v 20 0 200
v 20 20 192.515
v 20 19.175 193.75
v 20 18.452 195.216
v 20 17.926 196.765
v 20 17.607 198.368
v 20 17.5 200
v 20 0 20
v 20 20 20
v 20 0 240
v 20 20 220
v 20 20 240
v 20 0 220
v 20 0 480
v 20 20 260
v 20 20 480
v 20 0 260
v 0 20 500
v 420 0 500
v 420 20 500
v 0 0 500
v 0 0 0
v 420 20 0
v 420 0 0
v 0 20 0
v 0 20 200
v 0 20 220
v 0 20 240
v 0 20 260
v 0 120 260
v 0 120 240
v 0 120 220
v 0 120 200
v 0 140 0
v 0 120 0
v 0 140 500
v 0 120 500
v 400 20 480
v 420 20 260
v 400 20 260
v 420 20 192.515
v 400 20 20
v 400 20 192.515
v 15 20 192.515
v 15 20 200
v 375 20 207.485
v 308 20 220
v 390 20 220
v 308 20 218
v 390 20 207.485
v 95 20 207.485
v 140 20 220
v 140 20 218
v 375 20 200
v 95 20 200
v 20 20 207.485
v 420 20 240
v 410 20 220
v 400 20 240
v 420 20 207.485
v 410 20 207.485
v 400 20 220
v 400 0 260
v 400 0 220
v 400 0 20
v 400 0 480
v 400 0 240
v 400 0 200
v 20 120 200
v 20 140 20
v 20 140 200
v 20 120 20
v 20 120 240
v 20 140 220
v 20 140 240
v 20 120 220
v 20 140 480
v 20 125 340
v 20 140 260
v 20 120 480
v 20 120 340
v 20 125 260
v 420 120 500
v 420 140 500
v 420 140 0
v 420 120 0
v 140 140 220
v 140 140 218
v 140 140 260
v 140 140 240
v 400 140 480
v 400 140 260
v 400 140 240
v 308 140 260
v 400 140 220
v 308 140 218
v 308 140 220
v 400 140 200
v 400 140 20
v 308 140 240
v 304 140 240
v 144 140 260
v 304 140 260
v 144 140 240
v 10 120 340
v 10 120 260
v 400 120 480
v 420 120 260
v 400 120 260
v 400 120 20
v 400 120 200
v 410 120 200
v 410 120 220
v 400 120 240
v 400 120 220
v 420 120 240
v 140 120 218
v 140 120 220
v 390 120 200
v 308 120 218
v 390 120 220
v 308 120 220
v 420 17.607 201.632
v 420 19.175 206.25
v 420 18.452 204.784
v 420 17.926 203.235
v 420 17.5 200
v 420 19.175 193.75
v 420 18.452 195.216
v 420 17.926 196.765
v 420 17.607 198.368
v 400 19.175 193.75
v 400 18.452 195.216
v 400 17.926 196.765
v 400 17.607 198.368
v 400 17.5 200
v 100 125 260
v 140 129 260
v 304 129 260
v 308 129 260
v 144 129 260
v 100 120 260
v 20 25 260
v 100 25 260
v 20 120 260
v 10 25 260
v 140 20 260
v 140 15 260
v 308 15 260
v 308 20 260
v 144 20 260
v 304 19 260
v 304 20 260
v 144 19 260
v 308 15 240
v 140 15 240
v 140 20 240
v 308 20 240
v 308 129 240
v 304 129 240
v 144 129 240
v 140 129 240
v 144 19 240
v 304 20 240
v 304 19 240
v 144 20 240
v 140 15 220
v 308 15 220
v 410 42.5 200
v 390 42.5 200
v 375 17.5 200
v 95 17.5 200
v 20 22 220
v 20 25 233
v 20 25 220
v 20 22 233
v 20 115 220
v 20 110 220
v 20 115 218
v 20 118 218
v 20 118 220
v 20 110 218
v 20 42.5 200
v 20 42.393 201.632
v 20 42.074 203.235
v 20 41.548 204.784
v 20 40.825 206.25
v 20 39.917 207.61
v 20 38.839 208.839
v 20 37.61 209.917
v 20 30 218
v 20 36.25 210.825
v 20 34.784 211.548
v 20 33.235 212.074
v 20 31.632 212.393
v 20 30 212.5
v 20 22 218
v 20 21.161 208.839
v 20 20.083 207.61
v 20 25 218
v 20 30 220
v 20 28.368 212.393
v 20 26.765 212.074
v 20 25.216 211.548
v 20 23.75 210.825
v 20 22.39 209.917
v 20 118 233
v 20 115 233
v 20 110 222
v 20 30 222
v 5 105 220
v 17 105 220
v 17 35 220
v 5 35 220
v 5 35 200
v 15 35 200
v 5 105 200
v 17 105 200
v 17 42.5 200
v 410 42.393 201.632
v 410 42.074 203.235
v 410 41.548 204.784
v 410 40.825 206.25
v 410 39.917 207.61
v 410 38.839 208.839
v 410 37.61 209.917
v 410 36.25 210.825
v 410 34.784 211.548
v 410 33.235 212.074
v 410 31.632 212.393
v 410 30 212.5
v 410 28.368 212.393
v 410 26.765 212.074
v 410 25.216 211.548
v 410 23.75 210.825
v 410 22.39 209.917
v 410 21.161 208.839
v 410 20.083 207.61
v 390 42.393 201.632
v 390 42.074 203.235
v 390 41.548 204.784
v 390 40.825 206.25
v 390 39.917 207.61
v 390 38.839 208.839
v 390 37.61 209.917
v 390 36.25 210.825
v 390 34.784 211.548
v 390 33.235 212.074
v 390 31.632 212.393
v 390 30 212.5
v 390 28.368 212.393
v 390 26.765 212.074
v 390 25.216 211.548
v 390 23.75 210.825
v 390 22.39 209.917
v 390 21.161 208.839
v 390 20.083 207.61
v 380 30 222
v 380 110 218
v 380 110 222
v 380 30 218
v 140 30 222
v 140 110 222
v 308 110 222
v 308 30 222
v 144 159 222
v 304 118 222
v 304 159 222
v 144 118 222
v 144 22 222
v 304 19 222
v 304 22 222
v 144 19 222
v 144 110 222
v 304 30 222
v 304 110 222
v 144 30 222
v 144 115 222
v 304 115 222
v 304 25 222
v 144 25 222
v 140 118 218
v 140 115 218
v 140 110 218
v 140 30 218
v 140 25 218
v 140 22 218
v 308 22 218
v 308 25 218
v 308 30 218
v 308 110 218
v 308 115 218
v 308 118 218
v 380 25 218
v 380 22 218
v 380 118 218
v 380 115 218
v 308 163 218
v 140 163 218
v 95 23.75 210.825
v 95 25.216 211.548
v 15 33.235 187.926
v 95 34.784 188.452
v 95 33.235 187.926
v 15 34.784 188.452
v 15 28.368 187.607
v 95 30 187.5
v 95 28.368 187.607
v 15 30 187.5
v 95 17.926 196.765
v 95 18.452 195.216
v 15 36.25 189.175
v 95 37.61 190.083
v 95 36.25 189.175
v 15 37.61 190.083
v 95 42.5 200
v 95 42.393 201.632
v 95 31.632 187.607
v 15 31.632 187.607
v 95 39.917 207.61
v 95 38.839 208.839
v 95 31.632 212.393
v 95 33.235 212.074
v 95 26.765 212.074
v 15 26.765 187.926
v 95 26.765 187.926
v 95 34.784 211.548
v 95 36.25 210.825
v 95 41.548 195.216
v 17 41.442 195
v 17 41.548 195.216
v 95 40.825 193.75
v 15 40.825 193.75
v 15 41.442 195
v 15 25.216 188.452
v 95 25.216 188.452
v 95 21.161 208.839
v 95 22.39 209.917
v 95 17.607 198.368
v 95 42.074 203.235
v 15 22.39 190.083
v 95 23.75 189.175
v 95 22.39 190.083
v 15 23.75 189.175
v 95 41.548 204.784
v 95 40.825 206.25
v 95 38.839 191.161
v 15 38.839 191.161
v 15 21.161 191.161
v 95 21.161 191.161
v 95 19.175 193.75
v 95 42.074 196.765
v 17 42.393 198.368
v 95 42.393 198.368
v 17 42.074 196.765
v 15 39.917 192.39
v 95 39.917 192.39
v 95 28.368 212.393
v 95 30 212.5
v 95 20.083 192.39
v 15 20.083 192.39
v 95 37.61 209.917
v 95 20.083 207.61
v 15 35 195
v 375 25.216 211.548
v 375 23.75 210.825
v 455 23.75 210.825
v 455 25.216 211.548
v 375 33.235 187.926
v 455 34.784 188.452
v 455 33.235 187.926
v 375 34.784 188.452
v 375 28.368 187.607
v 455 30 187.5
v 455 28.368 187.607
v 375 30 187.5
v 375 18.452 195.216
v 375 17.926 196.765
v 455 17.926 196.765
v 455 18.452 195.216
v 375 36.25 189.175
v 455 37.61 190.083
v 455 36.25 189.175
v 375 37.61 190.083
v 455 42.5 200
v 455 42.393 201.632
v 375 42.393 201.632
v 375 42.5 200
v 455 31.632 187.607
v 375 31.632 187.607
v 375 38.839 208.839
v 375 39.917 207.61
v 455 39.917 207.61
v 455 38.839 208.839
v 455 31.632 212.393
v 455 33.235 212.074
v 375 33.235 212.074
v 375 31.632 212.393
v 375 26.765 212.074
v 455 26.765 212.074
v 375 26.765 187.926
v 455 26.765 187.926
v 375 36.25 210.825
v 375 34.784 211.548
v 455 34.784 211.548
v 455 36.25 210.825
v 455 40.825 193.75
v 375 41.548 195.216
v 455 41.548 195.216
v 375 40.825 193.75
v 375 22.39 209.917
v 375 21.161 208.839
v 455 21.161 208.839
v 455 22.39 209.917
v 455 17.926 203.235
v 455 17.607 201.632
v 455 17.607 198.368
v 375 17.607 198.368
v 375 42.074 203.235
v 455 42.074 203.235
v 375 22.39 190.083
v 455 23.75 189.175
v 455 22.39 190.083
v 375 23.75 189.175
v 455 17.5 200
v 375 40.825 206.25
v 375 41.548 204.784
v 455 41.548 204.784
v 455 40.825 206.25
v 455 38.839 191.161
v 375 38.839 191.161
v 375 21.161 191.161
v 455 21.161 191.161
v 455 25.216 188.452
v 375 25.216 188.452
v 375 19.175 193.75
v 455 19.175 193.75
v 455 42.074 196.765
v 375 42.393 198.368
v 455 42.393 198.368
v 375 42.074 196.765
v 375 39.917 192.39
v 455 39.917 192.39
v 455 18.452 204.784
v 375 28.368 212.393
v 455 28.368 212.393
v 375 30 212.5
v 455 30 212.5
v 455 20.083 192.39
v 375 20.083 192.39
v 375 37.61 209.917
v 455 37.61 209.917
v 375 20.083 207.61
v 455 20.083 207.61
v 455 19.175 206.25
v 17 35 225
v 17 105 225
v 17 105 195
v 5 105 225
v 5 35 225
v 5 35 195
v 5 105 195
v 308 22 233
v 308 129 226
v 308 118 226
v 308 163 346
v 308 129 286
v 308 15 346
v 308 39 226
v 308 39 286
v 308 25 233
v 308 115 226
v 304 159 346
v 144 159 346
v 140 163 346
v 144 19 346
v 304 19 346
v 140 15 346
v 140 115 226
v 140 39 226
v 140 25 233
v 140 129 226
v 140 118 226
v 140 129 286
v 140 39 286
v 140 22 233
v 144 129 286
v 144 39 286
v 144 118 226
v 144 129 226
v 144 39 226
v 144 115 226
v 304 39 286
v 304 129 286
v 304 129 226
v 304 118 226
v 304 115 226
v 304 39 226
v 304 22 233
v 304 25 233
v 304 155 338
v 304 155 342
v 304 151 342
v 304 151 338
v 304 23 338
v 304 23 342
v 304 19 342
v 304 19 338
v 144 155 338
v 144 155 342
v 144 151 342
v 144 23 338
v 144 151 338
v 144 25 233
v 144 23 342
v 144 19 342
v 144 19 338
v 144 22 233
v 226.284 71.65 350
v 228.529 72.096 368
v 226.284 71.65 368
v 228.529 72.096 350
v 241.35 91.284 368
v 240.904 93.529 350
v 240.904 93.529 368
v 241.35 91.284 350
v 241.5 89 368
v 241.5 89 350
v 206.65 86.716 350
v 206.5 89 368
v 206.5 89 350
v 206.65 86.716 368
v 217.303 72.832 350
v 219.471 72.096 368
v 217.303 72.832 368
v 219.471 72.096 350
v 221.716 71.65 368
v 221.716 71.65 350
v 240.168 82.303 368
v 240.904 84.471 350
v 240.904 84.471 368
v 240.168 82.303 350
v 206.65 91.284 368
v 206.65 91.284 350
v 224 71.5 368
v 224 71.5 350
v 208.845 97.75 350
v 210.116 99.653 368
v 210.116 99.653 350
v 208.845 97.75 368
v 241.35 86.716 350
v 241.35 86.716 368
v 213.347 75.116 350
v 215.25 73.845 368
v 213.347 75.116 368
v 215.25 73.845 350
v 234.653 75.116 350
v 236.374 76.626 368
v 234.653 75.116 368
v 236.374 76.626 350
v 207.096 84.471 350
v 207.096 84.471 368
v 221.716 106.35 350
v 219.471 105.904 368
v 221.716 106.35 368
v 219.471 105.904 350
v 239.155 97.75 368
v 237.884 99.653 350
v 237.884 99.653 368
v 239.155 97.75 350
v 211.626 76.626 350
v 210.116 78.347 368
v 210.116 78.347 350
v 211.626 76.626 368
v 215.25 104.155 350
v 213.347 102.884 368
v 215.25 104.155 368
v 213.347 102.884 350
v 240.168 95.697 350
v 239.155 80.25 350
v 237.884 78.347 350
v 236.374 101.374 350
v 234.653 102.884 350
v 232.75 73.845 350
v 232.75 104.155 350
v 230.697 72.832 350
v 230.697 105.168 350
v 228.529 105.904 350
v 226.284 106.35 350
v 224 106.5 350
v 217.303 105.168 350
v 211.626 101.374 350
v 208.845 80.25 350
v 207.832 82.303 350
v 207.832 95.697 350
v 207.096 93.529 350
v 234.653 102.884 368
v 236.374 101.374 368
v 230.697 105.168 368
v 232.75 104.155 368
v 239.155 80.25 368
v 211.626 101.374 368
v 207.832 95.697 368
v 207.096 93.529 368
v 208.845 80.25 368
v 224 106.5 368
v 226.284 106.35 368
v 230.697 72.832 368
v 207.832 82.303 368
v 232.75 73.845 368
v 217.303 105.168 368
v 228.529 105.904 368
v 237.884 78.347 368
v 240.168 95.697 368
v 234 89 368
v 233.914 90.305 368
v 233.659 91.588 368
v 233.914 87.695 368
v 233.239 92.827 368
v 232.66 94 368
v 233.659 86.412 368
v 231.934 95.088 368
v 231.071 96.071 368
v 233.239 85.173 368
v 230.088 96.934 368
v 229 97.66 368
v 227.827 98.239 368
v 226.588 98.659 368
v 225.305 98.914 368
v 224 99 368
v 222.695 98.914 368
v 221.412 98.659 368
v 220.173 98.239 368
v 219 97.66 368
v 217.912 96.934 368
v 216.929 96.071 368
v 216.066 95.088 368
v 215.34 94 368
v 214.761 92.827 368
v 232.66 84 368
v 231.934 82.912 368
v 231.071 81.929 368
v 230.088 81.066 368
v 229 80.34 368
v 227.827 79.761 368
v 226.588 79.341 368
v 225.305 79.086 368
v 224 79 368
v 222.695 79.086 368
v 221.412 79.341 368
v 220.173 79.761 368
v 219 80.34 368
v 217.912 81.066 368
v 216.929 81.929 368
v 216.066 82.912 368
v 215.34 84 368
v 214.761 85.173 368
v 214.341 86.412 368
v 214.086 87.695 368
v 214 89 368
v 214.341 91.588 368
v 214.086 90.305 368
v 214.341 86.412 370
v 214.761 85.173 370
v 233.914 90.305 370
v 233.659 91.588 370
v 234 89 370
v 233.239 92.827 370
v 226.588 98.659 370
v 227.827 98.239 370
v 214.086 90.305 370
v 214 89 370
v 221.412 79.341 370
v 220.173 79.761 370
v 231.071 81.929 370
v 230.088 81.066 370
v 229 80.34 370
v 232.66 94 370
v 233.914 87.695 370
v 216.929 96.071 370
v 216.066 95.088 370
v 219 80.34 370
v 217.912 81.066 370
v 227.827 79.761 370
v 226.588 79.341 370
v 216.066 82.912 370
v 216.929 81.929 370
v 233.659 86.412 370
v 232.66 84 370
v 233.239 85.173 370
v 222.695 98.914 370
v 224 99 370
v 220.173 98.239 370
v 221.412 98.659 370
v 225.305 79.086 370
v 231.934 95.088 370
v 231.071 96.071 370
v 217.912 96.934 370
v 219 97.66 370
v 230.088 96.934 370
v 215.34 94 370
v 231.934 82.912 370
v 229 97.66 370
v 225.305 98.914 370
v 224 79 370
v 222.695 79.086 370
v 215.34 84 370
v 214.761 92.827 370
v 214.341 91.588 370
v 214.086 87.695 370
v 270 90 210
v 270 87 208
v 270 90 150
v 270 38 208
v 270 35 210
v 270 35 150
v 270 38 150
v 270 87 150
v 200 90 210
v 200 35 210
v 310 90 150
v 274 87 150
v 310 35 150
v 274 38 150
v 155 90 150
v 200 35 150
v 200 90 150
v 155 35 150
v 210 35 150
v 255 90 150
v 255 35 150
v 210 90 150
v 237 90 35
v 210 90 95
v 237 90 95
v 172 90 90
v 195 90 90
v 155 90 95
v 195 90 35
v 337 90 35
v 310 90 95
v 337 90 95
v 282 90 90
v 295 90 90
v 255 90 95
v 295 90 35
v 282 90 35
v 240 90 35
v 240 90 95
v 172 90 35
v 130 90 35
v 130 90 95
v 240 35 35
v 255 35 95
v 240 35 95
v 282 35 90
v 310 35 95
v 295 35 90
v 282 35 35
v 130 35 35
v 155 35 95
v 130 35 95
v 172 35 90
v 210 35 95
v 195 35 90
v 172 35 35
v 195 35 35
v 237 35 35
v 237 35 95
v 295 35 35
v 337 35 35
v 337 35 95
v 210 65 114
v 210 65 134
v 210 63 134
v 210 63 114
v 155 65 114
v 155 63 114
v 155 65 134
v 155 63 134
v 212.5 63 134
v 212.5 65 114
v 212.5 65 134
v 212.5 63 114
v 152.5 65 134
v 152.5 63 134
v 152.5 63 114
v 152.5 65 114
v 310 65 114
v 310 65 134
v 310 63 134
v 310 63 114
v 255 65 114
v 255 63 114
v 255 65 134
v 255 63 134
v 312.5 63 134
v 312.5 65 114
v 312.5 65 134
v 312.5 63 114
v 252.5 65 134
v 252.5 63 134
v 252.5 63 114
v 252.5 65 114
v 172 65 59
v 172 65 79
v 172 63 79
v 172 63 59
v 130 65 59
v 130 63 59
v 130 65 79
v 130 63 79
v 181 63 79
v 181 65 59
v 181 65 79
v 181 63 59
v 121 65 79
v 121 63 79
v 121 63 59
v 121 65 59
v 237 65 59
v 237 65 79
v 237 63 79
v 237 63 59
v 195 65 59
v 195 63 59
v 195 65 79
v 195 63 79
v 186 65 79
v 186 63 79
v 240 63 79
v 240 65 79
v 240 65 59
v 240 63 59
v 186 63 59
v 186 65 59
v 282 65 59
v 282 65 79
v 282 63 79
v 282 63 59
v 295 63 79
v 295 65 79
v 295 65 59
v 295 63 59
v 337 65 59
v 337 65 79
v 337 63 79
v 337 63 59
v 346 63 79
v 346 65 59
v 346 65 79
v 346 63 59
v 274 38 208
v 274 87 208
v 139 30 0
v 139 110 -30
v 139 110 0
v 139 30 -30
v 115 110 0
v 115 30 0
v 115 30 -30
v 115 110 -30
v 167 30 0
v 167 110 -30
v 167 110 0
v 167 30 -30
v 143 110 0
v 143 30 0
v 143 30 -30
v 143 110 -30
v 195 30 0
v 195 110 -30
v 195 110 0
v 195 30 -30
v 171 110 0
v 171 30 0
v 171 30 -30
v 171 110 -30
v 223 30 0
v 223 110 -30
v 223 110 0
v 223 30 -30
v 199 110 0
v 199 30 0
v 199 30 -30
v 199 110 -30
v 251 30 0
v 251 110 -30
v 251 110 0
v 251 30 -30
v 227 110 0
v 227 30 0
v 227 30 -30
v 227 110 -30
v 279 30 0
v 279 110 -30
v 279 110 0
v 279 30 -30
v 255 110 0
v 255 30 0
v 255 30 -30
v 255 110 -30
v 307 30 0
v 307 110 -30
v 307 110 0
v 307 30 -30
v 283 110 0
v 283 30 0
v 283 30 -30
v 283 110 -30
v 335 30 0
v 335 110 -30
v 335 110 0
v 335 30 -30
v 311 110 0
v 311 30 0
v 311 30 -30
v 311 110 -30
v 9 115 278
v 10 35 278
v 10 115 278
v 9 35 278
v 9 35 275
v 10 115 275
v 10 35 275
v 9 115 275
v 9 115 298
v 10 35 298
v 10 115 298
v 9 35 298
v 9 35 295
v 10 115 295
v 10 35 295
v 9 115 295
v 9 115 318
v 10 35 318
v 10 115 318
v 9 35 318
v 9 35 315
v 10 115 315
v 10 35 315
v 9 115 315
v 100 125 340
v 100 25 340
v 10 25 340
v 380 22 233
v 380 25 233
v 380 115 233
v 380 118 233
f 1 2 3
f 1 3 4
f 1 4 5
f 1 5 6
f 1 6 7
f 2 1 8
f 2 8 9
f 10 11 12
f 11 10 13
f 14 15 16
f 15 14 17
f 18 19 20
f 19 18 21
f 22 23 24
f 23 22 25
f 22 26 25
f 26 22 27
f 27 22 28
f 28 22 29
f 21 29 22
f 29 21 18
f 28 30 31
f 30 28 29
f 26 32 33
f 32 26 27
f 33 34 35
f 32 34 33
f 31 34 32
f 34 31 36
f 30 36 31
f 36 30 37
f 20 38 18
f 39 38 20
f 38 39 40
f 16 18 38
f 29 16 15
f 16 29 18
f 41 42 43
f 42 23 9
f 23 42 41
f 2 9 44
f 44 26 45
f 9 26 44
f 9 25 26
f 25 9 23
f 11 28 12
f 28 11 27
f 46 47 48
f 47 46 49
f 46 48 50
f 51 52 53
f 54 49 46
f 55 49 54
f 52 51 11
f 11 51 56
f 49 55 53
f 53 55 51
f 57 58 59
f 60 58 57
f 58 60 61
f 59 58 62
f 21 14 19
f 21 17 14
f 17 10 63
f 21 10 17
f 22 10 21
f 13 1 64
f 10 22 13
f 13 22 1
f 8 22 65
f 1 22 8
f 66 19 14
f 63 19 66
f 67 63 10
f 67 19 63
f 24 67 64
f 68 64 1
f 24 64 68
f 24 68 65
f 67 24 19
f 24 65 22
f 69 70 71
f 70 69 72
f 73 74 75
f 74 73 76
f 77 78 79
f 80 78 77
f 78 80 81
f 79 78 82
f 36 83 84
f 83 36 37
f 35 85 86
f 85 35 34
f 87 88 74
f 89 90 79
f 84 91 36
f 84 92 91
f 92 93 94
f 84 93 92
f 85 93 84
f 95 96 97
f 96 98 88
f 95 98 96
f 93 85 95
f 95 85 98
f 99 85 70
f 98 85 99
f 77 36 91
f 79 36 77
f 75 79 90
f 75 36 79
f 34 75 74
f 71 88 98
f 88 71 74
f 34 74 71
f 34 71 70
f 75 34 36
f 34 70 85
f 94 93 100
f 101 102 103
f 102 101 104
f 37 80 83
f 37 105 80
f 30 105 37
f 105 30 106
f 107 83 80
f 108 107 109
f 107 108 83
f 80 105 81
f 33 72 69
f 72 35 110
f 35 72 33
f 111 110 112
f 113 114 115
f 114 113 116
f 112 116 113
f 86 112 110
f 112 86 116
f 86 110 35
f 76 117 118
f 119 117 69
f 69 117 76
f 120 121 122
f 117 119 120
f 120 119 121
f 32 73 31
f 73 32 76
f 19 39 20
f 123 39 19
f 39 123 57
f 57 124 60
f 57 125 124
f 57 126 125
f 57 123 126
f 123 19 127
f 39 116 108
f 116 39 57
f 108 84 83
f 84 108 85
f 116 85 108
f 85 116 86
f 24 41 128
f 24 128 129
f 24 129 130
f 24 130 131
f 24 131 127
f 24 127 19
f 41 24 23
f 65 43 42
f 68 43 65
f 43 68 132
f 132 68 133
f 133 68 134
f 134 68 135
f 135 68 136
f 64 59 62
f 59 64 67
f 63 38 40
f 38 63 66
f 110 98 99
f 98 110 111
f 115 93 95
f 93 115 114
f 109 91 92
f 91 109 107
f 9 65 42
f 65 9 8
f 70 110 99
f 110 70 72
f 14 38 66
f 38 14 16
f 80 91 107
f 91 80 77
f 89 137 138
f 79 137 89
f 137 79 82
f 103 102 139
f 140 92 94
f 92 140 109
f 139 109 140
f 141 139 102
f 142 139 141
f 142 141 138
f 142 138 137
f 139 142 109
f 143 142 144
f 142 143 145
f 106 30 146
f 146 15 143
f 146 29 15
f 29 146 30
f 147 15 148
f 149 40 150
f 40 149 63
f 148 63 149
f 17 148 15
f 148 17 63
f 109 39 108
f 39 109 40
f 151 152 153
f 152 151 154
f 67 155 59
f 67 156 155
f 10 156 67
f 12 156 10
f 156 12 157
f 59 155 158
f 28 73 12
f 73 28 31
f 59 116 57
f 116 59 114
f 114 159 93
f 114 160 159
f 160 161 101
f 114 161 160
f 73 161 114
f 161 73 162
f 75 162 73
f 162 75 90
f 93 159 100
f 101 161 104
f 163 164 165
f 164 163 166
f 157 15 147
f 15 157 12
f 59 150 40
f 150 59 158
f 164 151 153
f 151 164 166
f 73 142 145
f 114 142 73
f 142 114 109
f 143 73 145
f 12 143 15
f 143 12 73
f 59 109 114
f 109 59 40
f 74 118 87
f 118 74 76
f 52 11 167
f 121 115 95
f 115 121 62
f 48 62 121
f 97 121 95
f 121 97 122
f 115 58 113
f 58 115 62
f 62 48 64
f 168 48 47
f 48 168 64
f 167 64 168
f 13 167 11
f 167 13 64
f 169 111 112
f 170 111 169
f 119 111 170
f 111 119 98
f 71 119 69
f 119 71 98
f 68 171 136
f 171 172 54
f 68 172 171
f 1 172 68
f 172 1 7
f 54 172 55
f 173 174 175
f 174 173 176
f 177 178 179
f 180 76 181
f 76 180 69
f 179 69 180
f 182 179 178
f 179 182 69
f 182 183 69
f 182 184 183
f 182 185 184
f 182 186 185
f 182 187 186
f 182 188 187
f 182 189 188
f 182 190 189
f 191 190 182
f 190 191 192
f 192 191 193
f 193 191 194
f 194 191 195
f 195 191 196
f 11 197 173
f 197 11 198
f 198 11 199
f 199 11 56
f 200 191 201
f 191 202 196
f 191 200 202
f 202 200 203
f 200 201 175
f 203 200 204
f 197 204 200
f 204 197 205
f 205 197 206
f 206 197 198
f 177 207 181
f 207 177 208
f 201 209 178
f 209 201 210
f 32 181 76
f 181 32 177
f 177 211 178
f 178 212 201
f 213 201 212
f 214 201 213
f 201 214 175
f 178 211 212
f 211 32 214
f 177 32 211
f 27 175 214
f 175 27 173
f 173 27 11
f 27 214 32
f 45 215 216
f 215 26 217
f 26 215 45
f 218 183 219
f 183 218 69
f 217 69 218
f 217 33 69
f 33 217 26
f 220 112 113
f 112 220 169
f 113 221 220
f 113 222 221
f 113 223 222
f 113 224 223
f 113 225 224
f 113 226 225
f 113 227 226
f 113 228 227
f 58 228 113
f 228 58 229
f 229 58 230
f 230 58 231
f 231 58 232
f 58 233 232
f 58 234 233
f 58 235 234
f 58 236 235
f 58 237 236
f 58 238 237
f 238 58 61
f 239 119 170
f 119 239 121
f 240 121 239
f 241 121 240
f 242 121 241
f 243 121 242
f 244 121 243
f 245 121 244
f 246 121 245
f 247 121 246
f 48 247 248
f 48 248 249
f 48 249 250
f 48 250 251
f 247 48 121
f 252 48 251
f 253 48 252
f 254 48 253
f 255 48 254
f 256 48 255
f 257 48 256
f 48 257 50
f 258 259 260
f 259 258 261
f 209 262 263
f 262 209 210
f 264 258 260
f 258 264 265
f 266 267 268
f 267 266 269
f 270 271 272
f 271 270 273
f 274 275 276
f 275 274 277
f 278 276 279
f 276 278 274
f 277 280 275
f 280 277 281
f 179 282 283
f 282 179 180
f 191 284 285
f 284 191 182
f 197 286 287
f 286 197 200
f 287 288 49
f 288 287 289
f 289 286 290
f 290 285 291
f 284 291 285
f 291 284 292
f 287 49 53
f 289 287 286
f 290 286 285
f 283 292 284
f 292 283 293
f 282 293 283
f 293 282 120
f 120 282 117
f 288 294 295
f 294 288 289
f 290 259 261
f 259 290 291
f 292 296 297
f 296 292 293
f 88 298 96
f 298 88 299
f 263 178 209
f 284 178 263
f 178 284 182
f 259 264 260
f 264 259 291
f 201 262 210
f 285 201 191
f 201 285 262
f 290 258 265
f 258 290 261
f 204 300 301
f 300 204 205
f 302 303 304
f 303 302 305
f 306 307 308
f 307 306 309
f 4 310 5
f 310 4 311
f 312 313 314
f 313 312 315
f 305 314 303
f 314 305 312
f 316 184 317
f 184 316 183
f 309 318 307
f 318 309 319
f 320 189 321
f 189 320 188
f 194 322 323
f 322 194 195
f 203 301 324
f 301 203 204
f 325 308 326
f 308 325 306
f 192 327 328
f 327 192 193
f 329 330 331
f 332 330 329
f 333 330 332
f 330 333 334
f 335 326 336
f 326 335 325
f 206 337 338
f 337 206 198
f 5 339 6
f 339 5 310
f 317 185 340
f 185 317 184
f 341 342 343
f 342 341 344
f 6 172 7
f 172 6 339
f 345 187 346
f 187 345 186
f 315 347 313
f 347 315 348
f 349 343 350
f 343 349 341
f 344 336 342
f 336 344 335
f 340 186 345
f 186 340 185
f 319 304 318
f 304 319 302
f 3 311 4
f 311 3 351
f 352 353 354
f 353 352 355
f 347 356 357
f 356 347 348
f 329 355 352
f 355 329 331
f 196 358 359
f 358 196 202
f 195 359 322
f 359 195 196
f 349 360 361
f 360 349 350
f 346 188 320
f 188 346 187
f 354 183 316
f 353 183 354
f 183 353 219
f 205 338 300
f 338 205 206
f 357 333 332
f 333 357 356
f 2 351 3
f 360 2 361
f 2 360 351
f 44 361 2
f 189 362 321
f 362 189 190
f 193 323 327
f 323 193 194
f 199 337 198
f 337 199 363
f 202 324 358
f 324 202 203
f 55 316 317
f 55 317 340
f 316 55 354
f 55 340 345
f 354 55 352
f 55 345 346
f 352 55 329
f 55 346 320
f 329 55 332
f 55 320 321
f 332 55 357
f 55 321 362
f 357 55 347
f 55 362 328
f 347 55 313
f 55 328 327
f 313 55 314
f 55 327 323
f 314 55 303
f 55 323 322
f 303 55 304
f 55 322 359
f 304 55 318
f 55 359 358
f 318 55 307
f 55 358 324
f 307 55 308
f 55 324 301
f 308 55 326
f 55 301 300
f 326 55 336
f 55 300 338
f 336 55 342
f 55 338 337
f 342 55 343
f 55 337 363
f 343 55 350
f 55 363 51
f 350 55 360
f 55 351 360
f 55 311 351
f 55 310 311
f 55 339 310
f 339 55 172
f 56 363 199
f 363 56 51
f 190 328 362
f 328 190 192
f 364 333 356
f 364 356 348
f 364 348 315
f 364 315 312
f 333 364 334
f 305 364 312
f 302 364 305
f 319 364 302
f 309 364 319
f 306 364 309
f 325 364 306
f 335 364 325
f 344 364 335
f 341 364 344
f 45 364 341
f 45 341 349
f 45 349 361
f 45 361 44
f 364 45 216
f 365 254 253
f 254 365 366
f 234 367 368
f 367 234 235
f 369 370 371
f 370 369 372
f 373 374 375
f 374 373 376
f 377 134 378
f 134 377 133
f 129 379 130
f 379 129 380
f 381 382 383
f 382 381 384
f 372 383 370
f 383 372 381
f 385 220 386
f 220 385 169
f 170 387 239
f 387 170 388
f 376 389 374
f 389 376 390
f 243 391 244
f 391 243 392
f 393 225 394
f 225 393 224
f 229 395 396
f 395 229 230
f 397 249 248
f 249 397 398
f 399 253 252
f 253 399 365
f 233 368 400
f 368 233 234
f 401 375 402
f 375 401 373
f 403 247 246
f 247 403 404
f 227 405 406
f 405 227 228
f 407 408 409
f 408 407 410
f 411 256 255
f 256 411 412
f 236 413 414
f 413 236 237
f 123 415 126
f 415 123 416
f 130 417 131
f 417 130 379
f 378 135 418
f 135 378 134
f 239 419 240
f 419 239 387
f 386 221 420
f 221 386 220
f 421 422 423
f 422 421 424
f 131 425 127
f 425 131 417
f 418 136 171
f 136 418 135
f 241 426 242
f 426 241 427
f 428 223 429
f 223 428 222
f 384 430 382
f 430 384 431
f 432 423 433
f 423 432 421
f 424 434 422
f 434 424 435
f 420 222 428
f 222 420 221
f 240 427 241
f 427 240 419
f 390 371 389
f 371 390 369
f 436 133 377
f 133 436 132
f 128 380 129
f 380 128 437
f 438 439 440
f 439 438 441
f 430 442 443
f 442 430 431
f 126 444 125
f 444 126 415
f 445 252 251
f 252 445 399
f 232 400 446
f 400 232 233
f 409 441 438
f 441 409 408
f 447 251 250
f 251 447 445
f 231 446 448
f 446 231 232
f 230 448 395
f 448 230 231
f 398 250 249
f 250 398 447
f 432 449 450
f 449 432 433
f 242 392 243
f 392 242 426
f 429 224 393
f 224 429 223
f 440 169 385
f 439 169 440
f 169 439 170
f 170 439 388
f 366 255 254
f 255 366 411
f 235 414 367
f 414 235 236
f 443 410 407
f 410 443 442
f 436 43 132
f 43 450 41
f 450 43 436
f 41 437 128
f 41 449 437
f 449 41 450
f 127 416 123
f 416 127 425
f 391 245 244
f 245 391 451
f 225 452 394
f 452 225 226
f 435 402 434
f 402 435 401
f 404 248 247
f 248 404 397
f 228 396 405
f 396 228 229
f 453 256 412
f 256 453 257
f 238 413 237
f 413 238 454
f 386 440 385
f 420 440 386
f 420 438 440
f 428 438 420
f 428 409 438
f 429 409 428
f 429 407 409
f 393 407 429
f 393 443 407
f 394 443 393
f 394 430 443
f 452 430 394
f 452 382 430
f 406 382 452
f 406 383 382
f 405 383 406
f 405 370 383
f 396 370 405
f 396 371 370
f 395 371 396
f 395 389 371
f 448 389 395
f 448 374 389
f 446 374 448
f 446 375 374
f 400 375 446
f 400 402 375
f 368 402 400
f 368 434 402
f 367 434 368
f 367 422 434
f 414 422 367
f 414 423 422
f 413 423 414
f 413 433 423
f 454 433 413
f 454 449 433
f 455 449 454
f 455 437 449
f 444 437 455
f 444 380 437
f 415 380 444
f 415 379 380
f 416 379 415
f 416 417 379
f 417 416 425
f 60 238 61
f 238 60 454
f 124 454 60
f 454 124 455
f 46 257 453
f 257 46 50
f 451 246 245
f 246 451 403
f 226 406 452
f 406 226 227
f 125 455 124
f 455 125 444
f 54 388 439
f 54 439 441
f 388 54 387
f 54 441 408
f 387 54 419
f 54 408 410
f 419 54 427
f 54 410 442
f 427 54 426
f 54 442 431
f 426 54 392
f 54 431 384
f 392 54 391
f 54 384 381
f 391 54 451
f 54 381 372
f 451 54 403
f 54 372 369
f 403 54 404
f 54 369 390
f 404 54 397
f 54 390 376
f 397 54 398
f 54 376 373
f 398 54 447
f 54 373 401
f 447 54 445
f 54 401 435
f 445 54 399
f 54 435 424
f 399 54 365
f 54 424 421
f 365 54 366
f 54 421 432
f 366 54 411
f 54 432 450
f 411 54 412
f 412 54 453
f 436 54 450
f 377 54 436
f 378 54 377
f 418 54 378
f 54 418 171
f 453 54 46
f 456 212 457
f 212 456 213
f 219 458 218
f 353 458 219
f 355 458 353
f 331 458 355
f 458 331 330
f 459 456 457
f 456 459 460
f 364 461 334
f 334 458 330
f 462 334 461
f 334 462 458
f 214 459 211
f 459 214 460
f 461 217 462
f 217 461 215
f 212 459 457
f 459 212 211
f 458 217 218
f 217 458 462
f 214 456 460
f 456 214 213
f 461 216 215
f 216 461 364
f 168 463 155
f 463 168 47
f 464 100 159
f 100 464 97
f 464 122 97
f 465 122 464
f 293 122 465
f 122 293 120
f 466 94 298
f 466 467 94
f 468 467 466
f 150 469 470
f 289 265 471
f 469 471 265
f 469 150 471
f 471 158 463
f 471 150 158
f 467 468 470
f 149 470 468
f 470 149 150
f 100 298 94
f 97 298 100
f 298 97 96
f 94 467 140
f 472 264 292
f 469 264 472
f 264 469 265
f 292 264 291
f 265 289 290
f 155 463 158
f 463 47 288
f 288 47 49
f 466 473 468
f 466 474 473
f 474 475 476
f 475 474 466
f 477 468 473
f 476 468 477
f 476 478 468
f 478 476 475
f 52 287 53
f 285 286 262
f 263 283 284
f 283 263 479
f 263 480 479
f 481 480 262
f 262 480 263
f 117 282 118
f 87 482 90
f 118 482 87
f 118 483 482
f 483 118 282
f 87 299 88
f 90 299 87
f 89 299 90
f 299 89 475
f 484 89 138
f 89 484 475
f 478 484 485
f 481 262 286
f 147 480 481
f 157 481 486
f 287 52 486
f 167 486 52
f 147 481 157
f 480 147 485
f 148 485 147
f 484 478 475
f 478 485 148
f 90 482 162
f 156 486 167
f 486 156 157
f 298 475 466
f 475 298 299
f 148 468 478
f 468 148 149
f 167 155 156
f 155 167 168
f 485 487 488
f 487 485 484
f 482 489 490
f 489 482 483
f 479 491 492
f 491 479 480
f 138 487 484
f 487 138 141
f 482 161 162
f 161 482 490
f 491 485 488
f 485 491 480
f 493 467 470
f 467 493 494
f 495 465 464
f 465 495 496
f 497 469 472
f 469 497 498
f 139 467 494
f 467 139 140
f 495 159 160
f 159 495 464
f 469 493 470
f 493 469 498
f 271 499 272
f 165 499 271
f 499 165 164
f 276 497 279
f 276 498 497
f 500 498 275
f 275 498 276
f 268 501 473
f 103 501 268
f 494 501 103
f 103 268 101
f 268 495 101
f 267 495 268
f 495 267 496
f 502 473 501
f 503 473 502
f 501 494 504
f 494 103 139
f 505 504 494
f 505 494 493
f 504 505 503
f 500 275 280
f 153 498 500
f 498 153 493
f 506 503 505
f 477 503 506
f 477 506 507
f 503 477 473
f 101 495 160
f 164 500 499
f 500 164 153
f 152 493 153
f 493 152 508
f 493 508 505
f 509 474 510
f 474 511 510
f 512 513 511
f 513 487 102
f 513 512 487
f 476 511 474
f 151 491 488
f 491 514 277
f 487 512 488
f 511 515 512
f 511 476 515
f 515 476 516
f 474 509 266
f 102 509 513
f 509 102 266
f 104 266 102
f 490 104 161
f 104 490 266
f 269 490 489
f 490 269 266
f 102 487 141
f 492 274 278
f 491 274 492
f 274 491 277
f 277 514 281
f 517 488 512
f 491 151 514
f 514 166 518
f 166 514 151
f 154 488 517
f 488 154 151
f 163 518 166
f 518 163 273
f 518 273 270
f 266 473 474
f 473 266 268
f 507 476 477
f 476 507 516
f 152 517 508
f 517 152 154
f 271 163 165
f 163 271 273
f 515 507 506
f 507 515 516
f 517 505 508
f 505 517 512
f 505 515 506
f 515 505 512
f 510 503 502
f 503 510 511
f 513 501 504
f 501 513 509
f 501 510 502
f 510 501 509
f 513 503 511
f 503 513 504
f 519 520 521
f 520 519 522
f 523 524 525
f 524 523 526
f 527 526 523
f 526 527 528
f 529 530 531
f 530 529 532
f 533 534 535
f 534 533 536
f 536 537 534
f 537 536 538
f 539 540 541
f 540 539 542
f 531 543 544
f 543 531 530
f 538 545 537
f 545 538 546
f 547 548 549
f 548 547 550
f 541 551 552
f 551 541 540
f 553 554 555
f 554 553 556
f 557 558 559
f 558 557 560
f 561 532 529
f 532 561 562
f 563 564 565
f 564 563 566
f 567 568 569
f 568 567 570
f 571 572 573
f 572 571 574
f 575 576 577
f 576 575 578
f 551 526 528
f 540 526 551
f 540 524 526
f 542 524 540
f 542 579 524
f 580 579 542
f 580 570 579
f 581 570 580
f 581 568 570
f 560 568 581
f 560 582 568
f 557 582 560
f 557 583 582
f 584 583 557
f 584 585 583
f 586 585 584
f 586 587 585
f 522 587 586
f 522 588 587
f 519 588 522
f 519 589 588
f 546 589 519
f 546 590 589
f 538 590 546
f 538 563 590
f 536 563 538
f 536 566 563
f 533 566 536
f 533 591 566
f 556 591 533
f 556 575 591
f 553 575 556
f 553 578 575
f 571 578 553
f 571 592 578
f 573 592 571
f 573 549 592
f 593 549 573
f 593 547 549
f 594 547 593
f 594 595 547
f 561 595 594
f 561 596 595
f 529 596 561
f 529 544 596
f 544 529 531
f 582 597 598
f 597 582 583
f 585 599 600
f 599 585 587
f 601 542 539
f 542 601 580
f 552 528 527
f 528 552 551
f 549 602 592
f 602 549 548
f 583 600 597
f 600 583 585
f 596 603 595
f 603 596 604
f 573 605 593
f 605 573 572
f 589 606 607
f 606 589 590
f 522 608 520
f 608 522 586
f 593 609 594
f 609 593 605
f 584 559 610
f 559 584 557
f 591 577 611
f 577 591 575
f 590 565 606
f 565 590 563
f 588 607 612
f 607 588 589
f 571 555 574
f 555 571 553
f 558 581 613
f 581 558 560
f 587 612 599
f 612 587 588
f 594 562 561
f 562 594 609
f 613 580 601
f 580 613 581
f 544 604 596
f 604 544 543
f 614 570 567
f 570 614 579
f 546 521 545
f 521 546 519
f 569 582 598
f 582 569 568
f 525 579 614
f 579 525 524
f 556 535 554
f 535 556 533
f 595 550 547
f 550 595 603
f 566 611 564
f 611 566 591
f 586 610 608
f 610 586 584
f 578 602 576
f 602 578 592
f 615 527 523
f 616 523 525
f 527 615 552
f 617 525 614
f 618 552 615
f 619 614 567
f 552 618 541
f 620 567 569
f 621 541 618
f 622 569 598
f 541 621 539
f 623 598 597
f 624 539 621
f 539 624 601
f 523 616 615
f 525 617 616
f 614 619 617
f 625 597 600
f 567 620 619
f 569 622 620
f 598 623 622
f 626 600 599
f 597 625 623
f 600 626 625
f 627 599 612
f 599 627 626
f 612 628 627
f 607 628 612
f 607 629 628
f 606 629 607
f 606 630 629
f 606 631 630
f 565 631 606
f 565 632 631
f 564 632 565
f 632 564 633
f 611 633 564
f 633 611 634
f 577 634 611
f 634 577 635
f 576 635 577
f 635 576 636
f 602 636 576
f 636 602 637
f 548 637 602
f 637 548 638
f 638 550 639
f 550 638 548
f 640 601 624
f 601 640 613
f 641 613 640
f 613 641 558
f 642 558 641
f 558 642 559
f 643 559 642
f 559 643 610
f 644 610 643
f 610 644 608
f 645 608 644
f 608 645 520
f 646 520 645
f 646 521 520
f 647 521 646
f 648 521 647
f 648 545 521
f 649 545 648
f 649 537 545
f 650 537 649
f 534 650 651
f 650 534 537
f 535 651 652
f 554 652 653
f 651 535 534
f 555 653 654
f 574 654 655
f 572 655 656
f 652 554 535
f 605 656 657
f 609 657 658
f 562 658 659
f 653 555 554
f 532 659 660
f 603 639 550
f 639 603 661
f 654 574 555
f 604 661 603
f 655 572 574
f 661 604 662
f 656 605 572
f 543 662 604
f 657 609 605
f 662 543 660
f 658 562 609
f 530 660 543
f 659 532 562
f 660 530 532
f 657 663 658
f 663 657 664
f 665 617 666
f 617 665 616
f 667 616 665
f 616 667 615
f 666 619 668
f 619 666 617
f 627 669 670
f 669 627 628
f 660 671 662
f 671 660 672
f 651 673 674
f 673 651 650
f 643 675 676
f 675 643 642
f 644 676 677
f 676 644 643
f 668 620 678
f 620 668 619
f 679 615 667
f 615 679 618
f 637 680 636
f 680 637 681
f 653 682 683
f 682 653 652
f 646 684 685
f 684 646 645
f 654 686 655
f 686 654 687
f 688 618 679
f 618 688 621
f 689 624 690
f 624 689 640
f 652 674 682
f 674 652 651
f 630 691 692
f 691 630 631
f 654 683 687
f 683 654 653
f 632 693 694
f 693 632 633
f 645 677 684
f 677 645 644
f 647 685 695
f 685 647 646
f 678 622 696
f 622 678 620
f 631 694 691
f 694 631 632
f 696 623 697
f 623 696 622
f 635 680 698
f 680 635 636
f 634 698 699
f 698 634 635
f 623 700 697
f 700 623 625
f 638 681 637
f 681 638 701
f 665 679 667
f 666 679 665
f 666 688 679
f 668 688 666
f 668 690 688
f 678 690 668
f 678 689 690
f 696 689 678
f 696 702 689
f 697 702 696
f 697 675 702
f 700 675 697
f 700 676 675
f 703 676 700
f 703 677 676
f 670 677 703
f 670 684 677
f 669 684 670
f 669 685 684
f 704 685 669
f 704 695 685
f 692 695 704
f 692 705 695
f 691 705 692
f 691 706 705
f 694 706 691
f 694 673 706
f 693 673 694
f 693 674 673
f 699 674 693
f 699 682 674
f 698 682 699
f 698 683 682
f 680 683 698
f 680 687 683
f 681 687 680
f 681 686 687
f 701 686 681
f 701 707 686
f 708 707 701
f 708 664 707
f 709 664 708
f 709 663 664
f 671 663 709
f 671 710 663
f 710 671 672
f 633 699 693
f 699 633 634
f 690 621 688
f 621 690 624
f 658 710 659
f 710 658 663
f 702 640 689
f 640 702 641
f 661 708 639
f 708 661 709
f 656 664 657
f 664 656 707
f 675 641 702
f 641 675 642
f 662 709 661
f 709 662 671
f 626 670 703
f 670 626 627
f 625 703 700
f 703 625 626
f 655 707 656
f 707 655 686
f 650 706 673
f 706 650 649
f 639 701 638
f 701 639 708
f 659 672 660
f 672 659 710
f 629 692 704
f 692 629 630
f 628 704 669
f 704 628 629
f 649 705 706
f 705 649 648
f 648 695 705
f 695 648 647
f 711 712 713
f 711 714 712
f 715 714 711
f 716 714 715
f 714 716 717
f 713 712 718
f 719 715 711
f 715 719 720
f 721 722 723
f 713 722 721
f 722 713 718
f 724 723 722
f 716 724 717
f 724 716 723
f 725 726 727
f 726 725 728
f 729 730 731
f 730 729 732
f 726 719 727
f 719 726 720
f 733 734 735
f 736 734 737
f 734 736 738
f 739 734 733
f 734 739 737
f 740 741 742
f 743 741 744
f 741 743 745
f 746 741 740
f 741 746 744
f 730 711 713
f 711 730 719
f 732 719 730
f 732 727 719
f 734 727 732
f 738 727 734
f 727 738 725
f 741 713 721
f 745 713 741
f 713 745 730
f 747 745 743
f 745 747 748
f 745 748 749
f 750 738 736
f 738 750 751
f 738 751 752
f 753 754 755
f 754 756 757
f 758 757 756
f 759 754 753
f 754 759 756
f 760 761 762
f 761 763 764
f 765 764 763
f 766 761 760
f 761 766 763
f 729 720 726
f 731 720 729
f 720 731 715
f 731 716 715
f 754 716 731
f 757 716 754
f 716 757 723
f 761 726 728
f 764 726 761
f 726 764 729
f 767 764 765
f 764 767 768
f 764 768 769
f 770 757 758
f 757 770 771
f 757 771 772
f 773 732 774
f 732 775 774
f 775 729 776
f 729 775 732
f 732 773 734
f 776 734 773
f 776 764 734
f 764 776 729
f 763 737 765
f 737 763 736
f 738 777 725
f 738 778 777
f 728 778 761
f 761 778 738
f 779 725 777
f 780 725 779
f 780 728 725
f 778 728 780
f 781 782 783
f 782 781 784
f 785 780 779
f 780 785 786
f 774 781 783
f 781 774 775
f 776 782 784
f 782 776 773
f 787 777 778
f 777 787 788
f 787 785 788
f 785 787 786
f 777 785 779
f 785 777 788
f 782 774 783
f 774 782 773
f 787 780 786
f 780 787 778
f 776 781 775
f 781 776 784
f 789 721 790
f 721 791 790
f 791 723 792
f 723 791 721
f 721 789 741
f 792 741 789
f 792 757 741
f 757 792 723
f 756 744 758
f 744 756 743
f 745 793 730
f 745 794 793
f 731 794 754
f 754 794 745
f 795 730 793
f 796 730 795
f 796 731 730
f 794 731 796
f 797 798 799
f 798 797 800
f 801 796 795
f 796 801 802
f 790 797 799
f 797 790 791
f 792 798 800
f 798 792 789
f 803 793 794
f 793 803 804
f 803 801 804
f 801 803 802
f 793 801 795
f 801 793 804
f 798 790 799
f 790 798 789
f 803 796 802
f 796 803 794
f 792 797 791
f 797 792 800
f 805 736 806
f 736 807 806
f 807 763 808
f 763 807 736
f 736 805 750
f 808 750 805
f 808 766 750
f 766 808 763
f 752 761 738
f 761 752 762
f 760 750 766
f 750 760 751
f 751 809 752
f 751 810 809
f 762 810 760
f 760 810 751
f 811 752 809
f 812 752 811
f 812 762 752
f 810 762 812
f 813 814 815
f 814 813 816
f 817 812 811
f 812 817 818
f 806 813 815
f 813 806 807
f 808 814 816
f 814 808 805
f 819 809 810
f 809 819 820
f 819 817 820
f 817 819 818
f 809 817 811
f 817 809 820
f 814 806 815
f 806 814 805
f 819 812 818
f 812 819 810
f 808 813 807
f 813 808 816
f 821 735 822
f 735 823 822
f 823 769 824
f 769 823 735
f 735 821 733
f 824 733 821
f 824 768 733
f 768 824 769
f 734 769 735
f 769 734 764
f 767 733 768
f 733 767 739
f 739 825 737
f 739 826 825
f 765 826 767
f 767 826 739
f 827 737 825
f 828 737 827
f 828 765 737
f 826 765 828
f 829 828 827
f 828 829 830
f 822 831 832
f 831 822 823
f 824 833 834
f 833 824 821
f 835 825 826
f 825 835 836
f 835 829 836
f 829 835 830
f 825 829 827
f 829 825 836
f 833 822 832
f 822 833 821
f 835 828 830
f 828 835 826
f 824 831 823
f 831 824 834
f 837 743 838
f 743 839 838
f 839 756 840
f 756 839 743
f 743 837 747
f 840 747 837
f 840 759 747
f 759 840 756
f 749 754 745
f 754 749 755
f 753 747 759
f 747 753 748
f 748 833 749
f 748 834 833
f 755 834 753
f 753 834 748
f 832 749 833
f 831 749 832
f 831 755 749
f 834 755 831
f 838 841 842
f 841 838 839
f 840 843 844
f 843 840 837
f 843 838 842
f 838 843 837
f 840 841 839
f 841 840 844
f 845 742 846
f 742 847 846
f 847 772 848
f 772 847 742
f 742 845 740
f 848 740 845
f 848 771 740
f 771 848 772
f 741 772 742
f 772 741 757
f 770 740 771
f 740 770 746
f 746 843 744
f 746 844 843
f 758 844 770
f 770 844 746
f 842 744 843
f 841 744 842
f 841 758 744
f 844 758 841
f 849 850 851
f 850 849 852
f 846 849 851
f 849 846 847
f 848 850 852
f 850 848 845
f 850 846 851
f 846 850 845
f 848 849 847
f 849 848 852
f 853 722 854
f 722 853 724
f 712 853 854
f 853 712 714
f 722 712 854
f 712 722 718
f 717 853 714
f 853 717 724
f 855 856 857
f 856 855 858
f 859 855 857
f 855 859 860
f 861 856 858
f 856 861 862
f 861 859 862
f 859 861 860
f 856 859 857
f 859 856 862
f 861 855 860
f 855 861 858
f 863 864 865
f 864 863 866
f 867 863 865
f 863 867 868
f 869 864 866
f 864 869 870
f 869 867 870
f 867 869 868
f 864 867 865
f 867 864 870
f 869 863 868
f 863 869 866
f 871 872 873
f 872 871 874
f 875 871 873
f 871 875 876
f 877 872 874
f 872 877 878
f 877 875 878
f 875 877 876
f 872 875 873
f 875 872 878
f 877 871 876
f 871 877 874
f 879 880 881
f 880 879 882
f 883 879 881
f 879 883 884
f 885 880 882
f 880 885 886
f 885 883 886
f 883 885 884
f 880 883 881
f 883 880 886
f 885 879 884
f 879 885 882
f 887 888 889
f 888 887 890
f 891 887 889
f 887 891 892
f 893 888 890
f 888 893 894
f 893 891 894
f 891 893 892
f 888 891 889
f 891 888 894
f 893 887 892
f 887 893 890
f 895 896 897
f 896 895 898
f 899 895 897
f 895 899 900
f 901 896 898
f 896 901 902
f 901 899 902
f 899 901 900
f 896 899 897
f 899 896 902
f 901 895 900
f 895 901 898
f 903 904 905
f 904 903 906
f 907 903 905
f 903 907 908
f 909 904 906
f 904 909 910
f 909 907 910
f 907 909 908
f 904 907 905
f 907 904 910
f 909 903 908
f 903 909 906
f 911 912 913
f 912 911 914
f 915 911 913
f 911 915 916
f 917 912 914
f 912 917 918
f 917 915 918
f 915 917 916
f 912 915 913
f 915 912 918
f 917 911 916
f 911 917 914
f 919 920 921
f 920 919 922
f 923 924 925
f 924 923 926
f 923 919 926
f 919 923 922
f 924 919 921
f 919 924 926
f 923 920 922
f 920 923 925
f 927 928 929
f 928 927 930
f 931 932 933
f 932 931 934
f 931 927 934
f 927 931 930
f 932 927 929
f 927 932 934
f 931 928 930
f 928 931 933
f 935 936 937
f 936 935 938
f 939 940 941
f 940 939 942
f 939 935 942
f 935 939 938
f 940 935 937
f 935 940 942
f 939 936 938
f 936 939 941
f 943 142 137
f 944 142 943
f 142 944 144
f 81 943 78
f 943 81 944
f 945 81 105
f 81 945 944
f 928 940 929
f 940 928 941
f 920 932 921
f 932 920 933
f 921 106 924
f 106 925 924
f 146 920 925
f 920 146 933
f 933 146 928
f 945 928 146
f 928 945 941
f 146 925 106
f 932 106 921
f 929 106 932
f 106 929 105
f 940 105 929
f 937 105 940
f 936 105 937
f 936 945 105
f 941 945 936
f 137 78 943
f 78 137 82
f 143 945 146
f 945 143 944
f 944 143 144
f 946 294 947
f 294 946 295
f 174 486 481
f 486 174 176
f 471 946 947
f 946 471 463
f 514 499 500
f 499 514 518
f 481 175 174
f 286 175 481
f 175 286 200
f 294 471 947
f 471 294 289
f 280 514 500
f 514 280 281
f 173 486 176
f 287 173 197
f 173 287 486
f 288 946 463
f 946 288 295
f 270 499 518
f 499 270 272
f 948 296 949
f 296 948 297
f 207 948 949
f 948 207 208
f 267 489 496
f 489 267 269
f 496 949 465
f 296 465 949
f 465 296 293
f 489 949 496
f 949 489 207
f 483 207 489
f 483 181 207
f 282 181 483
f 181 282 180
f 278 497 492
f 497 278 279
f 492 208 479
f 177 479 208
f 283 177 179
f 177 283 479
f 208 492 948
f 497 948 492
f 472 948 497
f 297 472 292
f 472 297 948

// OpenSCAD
// ============================================================
// LEGO AI Sorting Machine — Full Assembly Preview
// ============================================================
// Composite scene showing all major subsystems in approximate
// assembled position. Used to render the README hero image.
// ============================================================

$fn = 48;

// ── COLOURS ────────────────────────────────────────────────
C_FRAME      = [0.55, 0.55, 0.55];   // silver aluminium extrusion
C_CHAMBER    = [0.95, 0.95, 0.95];   // white PLA scanning chamber
C_BELT       = [0.15, 0.15, 0.15];   // dark rubber belt
C_ROLLER     = [0.2,  0.5,  1.0];    // blue PETG rollers
C_GATE       = [0.2,  0.7,  0.4];    // green gate modules
C_SERVO      = [0.3,  0.3,  0.3];    // dark servo bodies
C_ELECTRONICS= [0.3,  0.5,  0.9];    // blue electronics box
C_CAMERA     = [0.1,  0.1,  0.1];    // black camera
C_LED        = [1.0,  1.0,  0.6];    // warm LED glow
C_BIN        = [0.9,  0.6,  0.2];    // orange bins
C_BRACKET    = [0.6,  0.6,  0.6];    // grey brackets

// ── FRAME ─────────────────────────────────────────────────
// 2020 aluminium extrusion skeleton (simplified rectangles)
module extrusion(len, axis="x") {
    color(C_FRAME)
    if (axis == "x")      cube([len, 20, 20]);
    else if (axis == "y") cube([20, len, 20]);
    else                  cube([20, 20, len]);
}

module frame() {
    // Four vertical uprights
    for (x = [0, 400]) for (y = [0, 120])
        translate([x, y, 0]) extrusion(500, "z");

    // Bottom horizontal rails (front & back, left & right)
    translate([0,   0,   0]) extrusion(420, "x");
    translate([0, 120,   0]) extrusion(420, "x");
    translate([0,   0, 480]) extrusion(420, "x");
    translate([0, 120, 480]) extrusion(420, "x");

    // Mid-height cross rails
    translate([0,   0, 240]) extrusion(420, "x");
    translate([0, 120, 240]) extrusion(420, "x");
    translate([0,   0, 240]) extrusion(140, "y");
    translate([400, 0, 240]) extrusion(140, "y");

    // Belt support rails
    translate([0,   0, 200]) extrusion(420, "x");
    translate([0, 120, 200]) extrusion(420, "x");
    translate([0,  20, 200]) extrusion(100, "y");
    translate([390, 20, 200]) extrusion(100, "y");
}

// ── CONVEYOR BELT ─────────────────────────────────────────
module belt_system() {
    // Belt surface
    color(C_BELT)
    translate([20, 30, 218]) cube([360, 80, 4]);

    // Drive roller
    color(C_ROLLER)
    translate([15, 30, 200])
        rotate([0, 90, 0]) cylinder(h=80, d=25);

    // Idler roller
    color(C_ROLLER)
    translate([375, 30, 200])
        rotate([0, 90, 0]) cylinder(h=80, d=25);

    // Tensioner bracket (simplified block)
    color(C_BRACKET)
    translate([5, 35, 195]) cube([12, 70, 30]);
}

// ── SCANNING CHAMBER ─────────────────────────────────────
// Positioned above belt at centre of frame
module scanning_chamber() {
    // Outer box (translucent so internals visible)
    color(C_CHAMBER, 0.5)
    translate([140, 15, 218])
        difference() {
            cube([168, 148, 128]);
            // Belt slot openings
            translate([-1, 24, 8]) cube([10, 90, 60]);
            translate([159, 24, 8]) cube([10, 90, 60]);
            // Interior hollow
            translate([4, 4, 4]) cube([160, 140, 130]);
        }

    // LED strip glow (thin strip along top interior)
    color(C_LED, 0.9)
    translate([144, 19, 338]) cube([160, 4, 4]);
    translate([144, 151, 338]) cube([160, 4, 4]);

    // Camera (black cylinder on top)
    color(C_CAMERA)
    translate([224, 89, 350]) cylinder(h=18, d=35);
    // lens
    color([0.0, 0.2, 0.8], 0.7)
    translate([224, 89, 366]) cylinder(h=4, d=20);
}

// ── GATE TREE ─────────────────────────────────────────────
// 5-level binary tree of Y-junction gate modules
// Positioned below belt on the right half of the frame
module one_gate(sz) {
    color(C_GATE, 0.85)
    cube([sz, 55, 60]);
    // Servo body
    color(C_SERVO)
    translate([sz/2-12, 40, 20]) cube([24, 13, 23]);
    // Gate flap
    color([0.9, 0.9, 0.9])
    translate([sz/2-30, 28, 24]) cube([60, 2, 20]);
}

module gate_tree() {
    // Level 0 — 1 gate (root), 70mm wide
    translate([200, 35, 150]) one_gate(70);

    // Level 1 — 2 gates, ~80mm wide each
    for (x = [155, 255])
        translate([x, 35, 90]) one_gate(55);

    // Level 2 — 4 gates
    for (x = [130, 195, 240, 295])
        translate([x, 35, 35]) one_gate(42);

    // Chutes between levels (thin slabs)
    color(C_GATE, 0.5) {
        // L1→L2 chutes
        translate([170, 38, 90]) cube([4, 49, 60]);
        translate([262, 38, 90]) cube([4, 49, 60]);
        // L0→L1 chutes
        translate([200, 38, 148]) cube([4, 49, 60]);
        translate([270, 38, 148]) cube([4, 49, 60]);
    }

    // Output bins (level 3 — 8 simplified boxes)
    for (i = [0:7]) {
        color(C_BIN, 0.8)
        translate([115 + i*28, 30, -30])
            cube([24, 80, 30]);
    }
}

// ── ELECTRONICS BOX ───────────────────────────────────────
module electronics_box() {
    color(C_ELECTRONICS, 0.9)
    translate([10, 25, 260]) cube([90, 100, 80]);
    // Vent slots
    color(C_FRAME)
    for (z = [275, 295, 315])
        translate([9, 35, z]) cube([2, 80, 3]);
    // Raspberry Pi green PCB (inside)
    color([0.1, 0.6, 0.1])
    translate([18, 35, 275]) cube([57, 56, 3]);
}

// ── BELT SIDE RAILS ───────────────────────────────────────
module side_rails() {
    color([0.85, 0.85, 0.85])
    translate([20, 22, 218]) cube([360, 3, 15]);
    color([0.85, 0.85, 0.85])
    translate([20, 115, 218]) cube([360, 3, 15]);
}

// ── FULL ASSEMBLY ─────────────────────────────────────────
frame();
belt_system();
scanning_chamber();
gate_tree();
electronics_box();
side_rails();

// ── LABEL (comment out if not wanted) ─────────────────────
// No text — keeping purely 3D for render clarity
